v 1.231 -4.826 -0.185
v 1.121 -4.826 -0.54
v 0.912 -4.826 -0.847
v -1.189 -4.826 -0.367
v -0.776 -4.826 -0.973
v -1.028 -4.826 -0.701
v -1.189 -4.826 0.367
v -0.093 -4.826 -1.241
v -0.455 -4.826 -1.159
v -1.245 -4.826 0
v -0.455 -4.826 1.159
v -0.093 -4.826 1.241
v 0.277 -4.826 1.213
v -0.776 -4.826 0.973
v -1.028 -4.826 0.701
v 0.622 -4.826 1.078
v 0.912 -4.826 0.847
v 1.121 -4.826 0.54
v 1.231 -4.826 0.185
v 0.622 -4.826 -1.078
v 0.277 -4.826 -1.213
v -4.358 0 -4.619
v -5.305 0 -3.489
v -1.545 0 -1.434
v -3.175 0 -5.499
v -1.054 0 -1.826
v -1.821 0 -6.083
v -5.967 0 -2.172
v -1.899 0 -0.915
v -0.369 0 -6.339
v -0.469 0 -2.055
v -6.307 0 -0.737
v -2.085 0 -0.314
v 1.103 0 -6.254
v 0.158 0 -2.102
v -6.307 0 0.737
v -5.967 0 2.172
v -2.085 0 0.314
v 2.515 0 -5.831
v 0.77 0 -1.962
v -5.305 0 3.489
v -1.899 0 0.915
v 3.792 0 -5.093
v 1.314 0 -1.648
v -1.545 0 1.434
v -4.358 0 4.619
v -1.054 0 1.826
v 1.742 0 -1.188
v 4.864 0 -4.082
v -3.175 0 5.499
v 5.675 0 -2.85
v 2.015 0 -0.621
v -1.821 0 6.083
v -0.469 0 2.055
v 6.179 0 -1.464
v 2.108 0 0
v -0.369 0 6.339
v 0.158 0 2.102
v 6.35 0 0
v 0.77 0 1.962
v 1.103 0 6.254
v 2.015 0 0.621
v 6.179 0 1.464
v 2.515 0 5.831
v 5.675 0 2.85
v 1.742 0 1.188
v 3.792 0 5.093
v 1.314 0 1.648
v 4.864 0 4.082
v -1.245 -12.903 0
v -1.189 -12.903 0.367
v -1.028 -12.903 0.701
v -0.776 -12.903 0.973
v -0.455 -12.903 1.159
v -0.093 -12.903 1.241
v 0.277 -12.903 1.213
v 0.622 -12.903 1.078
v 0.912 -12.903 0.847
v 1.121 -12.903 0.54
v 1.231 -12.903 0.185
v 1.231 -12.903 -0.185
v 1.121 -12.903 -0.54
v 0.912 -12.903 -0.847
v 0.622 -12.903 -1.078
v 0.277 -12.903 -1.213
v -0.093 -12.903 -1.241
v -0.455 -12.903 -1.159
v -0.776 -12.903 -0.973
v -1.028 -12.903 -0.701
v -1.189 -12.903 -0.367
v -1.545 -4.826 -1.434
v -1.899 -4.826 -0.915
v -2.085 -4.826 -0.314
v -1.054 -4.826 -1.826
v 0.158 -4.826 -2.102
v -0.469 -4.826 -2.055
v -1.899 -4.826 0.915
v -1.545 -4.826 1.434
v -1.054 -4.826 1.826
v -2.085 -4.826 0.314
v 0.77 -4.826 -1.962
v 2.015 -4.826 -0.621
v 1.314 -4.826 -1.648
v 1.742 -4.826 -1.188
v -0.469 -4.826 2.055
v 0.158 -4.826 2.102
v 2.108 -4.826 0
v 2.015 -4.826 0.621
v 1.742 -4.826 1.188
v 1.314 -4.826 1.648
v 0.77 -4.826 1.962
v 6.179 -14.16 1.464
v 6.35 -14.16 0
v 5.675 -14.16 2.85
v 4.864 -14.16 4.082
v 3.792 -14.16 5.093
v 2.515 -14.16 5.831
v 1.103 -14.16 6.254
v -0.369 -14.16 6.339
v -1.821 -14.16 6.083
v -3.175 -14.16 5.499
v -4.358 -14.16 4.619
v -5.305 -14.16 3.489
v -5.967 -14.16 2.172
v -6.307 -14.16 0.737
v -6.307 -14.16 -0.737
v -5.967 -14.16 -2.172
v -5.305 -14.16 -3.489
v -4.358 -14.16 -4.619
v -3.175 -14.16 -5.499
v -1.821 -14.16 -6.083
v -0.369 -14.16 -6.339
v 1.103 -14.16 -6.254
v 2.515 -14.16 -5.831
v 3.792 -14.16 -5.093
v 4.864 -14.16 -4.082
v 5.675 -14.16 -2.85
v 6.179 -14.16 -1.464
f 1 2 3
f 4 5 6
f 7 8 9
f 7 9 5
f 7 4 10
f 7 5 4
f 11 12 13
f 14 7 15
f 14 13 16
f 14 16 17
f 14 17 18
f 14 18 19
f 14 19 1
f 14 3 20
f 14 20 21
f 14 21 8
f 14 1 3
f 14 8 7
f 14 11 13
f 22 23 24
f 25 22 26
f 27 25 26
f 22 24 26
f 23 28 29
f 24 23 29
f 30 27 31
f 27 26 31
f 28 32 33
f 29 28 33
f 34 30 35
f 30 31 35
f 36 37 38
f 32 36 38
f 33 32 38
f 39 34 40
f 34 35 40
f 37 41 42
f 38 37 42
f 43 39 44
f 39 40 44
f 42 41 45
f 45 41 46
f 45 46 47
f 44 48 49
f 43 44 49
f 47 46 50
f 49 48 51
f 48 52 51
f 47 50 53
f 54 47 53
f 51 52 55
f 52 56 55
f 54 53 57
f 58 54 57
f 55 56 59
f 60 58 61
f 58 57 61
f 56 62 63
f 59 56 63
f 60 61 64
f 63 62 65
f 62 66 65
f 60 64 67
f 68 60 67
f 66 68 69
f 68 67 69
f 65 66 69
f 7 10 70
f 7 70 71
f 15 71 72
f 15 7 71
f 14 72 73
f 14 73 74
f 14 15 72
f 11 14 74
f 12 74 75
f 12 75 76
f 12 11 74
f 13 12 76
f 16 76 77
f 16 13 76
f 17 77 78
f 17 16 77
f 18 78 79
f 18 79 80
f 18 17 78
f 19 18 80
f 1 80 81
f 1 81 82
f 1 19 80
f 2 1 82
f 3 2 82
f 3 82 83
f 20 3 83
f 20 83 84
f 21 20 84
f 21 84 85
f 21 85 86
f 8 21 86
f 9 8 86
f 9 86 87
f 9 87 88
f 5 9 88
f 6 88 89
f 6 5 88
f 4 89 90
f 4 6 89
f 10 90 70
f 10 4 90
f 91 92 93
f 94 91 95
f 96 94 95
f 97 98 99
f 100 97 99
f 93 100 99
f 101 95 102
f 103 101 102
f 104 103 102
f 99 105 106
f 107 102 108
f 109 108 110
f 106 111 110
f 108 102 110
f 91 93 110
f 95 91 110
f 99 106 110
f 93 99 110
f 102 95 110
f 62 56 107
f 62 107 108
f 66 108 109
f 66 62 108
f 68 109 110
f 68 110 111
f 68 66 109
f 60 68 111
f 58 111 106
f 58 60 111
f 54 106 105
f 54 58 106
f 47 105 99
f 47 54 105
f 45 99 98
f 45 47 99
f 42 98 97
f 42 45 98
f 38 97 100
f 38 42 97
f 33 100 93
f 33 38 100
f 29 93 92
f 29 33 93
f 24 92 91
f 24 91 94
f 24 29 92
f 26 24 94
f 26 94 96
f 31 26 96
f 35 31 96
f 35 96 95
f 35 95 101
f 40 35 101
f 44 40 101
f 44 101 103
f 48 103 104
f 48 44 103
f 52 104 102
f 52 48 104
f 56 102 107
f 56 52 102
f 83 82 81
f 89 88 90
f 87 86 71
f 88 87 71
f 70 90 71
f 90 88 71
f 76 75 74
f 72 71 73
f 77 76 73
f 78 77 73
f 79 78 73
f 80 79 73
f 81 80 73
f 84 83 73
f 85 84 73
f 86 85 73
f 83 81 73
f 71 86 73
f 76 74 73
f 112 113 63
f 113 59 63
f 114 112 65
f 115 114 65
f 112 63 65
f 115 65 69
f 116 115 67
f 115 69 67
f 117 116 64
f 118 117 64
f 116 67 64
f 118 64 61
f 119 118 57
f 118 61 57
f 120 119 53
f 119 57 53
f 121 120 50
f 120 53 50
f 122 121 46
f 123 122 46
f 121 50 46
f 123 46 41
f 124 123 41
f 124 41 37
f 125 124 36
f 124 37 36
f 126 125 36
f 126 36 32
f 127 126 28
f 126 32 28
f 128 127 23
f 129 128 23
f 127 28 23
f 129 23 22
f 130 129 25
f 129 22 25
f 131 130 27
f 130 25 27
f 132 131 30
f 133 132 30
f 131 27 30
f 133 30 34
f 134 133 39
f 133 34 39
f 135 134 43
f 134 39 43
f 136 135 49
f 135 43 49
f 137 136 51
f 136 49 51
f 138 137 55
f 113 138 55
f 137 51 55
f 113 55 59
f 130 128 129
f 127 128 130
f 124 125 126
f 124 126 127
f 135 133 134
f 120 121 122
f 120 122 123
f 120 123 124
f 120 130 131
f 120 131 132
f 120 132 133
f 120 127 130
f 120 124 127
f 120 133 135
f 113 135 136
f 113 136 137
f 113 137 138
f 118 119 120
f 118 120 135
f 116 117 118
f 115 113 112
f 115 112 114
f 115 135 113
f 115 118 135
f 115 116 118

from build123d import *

# Parameters (mm, degrees)
F0_R     = 6.35
F0_R_2   = 2.1082
F1_DEPTH = 4.826
F2_R     = 6.35
F3_DEPTH = 9.3345
F4_R     = 1.2446
F5_DEPTH = 8.0772


with BuildPart() as f1:
    # F0 (on Front) → F1 (new body)
    with BuildSketch(Plane.XZ):
        Circle(F0_R)
        Circle(F0_R_2, mode=Mode.SUBTRACT)
    extrude(amount=F1_DEPTH)

    # F2 (on face) → F3 (join)
    with BuildSketch(Plane.XZ.offset(4.826)):
        Circle(F2_R)
    extrude(amount=F3_DEPTH)


with BuildPart() as f5:
    # F4 (on face) → F5 (new body)
    with BuildSketch(Plane(origin=(0, -4.826, 0), x_dir=(-1, 0, 0), z_dir=(0, 1, 0))):
        Circle(F4_R)
    extrude(amount=-F5_DEPTH)


solid = Compound([f1.part, f5.part])
